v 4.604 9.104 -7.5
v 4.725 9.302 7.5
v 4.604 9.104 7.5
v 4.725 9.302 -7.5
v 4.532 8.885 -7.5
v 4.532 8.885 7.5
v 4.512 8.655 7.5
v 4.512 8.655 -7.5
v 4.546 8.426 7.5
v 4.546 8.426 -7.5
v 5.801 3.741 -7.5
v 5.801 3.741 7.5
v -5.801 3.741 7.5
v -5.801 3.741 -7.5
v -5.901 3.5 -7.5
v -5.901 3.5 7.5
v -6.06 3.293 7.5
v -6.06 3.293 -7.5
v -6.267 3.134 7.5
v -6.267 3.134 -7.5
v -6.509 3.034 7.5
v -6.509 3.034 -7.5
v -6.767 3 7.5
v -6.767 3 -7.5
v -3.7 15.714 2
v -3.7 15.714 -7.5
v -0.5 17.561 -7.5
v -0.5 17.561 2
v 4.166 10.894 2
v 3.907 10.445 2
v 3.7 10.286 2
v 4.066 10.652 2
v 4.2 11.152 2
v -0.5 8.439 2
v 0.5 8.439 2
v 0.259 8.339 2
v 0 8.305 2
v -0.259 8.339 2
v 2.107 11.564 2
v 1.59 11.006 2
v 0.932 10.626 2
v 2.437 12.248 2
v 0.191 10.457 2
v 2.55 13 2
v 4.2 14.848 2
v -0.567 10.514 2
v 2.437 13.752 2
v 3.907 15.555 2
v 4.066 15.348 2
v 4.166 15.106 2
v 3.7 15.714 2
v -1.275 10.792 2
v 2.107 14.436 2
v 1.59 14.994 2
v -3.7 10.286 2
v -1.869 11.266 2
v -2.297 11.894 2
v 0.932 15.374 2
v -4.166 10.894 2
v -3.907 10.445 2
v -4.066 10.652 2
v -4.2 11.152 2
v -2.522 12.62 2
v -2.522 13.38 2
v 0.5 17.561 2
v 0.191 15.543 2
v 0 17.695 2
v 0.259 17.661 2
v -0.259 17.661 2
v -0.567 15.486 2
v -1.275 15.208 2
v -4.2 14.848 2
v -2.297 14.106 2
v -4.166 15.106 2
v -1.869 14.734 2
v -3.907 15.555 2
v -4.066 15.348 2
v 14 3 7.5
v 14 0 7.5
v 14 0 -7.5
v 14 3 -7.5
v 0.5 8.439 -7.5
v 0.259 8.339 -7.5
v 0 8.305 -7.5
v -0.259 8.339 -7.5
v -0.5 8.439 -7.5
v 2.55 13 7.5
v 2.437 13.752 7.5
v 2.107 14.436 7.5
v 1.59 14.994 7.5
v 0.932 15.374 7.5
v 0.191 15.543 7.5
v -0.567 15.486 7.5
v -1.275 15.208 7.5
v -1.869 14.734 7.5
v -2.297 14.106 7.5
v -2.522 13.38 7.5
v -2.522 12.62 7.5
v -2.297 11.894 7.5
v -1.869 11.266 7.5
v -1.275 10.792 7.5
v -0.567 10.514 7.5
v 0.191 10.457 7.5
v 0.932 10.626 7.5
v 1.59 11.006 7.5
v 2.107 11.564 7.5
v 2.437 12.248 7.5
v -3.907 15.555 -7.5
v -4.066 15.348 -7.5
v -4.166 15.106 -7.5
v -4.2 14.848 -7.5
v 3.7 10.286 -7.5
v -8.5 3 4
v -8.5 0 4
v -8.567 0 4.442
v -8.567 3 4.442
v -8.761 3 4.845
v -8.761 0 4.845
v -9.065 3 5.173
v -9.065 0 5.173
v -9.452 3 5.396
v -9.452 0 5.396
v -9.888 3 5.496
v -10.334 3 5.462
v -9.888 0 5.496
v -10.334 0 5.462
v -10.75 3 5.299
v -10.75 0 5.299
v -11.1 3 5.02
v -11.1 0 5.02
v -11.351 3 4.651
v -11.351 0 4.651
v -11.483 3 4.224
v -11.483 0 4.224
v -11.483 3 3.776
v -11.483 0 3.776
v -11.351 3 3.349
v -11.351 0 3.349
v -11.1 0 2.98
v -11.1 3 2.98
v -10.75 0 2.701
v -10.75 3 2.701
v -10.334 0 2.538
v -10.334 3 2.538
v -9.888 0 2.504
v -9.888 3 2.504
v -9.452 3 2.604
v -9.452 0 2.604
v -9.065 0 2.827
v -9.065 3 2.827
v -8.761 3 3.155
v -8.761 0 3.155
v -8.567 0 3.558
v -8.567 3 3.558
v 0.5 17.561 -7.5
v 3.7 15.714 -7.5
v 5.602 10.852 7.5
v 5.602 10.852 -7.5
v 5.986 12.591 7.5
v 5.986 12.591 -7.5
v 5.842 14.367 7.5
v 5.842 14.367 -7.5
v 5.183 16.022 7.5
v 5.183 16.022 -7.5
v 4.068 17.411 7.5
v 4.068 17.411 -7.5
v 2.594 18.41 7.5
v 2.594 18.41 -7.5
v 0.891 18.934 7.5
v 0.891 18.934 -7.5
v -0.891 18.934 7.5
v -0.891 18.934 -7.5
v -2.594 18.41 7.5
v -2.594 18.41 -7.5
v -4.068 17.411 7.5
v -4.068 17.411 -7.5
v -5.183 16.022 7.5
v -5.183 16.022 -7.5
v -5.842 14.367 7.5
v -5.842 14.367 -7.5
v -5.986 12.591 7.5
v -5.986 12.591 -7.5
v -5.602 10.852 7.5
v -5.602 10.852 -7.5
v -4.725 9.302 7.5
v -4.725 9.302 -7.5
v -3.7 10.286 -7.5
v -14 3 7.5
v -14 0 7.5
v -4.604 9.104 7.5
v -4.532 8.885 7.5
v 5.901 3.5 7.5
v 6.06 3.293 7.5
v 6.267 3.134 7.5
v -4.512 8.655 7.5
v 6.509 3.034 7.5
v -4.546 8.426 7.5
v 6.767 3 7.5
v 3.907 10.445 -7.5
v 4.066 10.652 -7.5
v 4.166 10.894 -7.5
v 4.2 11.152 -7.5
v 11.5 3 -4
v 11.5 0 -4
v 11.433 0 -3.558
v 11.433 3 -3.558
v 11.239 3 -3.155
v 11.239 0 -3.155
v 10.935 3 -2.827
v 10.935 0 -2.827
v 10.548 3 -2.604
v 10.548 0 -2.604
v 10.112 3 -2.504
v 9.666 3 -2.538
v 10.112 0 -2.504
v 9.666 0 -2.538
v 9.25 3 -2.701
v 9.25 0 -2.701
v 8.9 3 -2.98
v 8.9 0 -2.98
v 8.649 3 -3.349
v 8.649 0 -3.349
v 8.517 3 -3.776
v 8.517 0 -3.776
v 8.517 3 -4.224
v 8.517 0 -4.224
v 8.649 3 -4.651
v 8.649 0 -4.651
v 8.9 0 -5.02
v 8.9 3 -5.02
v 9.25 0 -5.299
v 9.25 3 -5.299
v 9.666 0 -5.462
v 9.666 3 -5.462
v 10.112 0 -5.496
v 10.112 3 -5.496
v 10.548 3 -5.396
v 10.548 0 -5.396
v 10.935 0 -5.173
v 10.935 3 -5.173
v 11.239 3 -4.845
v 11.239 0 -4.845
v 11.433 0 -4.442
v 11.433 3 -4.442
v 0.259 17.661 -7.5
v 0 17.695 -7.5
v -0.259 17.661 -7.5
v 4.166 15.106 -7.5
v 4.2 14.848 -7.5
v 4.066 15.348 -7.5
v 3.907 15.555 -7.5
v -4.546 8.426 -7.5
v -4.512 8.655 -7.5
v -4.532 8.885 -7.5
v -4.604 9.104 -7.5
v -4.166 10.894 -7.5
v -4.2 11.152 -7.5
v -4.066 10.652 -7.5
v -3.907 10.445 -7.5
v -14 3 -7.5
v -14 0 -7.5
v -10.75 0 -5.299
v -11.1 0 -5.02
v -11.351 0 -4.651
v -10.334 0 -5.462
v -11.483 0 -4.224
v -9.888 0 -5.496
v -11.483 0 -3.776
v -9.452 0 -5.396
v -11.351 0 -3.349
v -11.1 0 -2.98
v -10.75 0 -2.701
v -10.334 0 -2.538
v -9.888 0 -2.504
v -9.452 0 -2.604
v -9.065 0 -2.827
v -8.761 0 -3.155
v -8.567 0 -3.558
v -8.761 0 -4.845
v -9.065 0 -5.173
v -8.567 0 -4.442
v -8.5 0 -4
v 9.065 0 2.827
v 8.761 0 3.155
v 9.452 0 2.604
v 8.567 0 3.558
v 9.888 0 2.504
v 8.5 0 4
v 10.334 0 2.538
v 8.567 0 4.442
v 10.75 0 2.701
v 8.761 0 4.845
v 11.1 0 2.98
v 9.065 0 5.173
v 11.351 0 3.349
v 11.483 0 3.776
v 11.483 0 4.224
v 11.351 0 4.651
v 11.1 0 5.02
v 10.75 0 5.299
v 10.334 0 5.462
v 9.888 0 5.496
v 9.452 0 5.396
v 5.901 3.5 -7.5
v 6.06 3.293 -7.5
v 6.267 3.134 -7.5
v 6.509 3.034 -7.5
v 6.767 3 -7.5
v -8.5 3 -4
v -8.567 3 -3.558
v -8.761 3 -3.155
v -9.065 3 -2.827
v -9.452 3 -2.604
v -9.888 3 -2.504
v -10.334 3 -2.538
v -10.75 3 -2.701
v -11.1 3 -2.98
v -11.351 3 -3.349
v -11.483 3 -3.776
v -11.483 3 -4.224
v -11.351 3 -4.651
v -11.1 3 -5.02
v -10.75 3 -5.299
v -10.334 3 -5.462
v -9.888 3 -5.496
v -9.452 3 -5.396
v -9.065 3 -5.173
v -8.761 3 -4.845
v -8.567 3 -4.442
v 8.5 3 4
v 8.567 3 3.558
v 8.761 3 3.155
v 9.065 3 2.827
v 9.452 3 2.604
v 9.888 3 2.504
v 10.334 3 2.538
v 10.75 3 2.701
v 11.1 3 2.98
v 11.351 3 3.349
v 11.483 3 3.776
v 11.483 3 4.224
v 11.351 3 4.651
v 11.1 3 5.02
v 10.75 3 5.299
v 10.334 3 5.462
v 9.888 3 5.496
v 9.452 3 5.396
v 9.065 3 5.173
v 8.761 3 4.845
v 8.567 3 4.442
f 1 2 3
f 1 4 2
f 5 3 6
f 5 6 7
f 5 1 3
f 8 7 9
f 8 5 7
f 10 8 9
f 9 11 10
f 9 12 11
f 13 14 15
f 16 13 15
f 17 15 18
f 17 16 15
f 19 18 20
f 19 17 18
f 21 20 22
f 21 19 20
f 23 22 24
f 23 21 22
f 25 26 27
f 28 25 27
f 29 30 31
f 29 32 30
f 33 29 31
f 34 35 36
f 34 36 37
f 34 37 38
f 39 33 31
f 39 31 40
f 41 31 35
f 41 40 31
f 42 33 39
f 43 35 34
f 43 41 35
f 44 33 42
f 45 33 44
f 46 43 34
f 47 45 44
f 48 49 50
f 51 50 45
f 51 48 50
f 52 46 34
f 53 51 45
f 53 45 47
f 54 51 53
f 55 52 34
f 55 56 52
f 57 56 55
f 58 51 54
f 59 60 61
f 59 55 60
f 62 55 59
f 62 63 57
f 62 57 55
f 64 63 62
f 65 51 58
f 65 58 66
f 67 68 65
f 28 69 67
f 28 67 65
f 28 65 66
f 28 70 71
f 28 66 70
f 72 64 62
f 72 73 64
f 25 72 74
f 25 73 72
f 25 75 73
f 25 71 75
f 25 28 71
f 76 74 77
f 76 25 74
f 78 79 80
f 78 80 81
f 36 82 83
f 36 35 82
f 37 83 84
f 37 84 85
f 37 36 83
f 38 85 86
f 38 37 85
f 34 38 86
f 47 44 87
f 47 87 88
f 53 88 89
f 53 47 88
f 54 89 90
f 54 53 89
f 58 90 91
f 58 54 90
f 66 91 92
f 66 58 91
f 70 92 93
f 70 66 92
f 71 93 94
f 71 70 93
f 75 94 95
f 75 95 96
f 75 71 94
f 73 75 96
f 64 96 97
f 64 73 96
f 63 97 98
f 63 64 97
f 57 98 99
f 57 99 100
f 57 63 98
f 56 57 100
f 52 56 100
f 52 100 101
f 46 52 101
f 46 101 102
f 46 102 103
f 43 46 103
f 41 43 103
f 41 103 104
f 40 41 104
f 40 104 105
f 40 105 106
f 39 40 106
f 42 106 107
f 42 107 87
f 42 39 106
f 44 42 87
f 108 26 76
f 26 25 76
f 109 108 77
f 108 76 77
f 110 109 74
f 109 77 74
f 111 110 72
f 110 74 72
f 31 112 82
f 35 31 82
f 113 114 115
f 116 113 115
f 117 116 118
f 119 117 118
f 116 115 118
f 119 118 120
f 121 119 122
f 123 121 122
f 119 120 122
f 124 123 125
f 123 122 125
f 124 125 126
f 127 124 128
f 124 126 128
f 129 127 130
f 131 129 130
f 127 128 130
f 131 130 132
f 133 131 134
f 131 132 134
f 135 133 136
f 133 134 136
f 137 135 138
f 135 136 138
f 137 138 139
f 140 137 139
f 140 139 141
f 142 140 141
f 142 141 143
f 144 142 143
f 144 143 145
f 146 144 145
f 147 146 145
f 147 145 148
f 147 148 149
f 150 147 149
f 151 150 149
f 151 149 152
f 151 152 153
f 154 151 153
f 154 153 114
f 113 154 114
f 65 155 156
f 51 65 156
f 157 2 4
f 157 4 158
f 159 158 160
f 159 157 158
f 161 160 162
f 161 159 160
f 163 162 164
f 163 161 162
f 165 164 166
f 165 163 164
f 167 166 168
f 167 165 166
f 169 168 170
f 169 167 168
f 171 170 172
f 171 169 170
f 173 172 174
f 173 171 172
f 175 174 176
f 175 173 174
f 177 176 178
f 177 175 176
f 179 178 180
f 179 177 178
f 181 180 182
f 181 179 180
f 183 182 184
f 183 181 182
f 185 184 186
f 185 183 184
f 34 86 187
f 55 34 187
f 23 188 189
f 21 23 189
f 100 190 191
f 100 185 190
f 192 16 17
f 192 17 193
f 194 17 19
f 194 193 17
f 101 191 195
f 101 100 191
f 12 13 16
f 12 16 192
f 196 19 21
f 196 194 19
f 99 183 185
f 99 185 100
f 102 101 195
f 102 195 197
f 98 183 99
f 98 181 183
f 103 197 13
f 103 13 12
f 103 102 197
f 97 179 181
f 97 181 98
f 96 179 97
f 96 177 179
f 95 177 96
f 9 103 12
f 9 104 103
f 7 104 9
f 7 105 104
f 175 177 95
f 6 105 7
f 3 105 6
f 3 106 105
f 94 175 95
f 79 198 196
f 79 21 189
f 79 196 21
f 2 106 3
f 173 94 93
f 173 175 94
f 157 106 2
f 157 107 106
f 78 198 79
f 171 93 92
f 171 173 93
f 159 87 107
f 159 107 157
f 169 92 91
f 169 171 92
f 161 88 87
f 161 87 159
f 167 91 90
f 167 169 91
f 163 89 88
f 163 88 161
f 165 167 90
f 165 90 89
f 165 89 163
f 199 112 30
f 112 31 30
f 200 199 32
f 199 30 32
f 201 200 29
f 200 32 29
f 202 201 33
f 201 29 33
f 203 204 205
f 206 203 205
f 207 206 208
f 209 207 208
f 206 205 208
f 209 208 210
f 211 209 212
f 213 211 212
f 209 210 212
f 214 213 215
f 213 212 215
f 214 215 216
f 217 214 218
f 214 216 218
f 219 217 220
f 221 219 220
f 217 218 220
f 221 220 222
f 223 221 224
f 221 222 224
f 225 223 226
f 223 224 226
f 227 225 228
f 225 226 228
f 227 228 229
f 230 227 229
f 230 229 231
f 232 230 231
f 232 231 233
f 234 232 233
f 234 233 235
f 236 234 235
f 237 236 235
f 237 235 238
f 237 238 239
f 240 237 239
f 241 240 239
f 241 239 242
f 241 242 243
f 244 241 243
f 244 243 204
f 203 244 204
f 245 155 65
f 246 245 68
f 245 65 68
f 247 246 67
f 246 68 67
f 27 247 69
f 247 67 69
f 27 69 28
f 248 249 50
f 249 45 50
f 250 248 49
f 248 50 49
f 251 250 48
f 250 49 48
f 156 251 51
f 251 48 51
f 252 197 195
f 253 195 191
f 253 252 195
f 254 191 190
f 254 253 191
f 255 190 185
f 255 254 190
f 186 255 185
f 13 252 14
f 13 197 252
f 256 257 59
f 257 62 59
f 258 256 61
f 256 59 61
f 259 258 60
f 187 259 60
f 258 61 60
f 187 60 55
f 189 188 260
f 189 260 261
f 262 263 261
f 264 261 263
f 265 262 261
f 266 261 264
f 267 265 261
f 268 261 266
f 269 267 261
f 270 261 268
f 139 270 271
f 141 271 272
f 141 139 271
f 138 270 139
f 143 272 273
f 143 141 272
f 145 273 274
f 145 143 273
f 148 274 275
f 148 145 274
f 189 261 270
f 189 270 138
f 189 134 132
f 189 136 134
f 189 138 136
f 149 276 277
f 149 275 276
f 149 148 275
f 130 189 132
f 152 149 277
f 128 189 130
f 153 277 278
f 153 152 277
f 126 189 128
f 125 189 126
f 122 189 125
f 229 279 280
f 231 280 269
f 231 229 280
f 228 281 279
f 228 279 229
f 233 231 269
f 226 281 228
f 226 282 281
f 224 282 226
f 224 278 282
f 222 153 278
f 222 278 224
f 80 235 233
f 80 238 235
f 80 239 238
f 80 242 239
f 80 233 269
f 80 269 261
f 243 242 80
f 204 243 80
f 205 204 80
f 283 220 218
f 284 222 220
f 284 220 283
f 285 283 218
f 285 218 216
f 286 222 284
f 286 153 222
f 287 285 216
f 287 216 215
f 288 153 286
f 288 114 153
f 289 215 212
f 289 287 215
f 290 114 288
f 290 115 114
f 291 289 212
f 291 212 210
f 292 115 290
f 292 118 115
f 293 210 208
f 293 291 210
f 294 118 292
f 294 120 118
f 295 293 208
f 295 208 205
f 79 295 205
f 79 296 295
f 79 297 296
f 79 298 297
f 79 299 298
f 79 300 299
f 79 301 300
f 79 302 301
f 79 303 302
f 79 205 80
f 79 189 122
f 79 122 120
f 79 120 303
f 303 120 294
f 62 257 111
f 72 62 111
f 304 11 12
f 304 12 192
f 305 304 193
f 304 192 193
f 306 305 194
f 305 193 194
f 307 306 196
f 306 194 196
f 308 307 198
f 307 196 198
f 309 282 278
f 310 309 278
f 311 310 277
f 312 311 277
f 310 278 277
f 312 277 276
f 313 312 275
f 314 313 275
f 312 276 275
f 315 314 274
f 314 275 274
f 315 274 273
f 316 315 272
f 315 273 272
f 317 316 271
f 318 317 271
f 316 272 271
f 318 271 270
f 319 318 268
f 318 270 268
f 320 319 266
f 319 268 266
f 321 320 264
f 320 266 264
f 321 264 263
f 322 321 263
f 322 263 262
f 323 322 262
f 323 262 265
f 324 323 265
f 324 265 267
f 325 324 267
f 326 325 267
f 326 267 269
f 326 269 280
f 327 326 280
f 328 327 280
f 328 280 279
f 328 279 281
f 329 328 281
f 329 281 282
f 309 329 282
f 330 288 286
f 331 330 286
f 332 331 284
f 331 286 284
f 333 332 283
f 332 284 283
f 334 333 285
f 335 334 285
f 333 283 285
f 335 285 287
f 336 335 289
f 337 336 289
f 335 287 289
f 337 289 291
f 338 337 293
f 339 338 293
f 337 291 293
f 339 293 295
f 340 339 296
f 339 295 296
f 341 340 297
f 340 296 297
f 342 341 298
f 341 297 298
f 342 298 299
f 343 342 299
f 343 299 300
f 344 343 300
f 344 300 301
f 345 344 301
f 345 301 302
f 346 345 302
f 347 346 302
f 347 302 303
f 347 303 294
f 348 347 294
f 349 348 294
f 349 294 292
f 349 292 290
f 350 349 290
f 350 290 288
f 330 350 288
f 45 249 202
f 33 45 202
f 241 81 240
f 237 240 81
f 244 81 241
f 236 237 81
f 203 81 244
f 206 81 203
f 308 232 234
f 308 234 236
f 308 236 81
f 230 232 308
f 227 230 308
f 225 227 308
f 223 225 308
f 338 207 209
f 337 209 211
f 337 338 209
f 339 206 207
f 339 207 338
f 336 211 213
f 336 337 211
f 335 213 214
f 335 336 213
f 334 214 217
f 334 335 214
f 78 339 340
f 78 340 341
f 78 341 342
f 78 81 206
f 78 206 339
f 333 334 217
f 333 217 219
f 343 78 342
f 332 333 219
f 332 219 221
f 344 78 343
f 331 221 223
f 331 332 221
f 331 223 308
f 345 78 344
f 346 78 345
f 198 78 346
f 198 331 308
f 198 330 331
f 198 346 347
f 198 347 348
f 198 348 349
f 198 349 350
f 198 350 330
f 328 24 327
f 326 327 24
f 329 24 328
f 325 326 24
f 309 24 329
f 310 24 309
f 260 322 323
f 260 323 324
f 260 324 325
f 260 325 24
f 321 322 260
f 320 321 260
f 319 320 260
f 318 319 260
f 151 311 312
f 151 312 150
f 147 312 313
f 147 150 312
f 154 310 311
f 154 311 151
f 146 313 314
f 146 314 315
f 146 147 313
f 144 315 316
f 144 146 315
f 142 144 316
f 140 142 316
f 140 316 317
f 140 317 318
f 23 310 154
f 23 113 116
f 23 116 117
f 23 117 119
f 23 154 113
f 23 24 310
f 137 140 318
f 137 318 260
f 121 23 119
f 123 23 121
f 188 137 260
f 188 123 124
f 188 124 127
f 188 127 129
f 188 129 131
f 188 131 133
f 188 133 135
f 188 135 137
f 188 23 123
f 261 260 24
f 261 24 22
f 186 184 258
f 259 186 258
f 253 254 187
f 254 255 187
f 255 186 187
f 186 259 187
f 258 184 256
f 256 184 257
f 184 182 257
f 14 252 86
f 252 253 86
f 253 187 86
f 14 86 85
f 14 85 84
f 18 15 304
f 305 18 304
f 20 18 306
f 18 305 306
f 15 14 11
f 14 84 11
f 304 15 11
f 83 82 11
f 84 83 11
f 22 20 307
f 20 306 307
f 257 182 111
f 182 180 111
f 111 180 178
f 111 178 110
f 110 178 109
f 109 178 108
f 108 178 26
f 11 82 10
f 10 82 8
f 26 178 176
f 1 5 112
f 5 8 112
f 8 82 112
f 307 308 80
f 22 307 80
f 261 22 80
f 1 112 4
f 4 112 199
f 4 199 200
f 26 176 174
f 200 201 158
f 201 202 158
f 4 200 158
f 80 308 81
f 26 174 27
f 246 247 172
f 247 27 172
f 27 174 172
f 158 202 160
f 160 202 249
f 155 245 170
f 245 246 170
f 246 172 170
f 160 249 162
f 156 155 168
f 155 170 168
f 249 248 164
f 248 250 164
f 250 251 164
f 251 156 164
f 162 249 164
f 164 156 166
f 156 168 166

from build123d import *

# Parameters (mm, degrees)
SKETCH_1_R          = 6
SKETCH_1_R_2        = 2.55
EXTRUDE_1_DEPTH     = 7.5
SKETCH_2_R          = 1.5
CUT_EXTRUDE_1_DEPTH = 25.763884994
CUT_EXTRUDE_2_DEPTH = 9.5
FILLET_1_R          = 1


with BuildPart() as part:
    # 草图1 → 凸台-拉伸1 (new, symmetric)
    # profile 1 of 2: a face of its own
    with BuildSketch(Plane.XY):
        with Locations((0, 13)):
            Circle(SKETCH_1_R)
        with Locations((0, 13)):
            Circle(SKETCH_1_R_2, mode=Mode.SUBTRACT)
    # profile 2 of 2: a face of its own
    with BuildSketch(Plane.XY):
        with BuildLine():
            ThreePointArc((4.410490728, 8.932129361), (0, 7), (-4.410490728, 8.932129361))
            Line((-4.410490728, 8.932129361), (-6, 3))
            Line((-6, 3), (-14, 3))
            Line((-14, 3), (-14, 0))
            Line((-14, 0), (14, 0))
            Line((14, 0), (14, 3))
            Line((14, 3), (6, 3))
            Line((6, 3), (4.410490728, 8.932129361))
        make_face()
    extrude(amount=EXTRUDE_1_DEPTH, both=True)

    # 草图2 → 切除-拉伸1 (cut, through all)
    with BuildSketch(Plane.XZ):
        with Locations((-10, 4)):
            Circle(SKETCH_2_R)
        with Locations((-10, -4)):
            Circle(SKETCH_2_R)
        with Locations((10, -4)):
            Circle(SKETCH_2_R)
        with Locations(Location((10, 4, 0), (0, 0, 180))):
            Circle(SKETCH_2_R)
    extrude(amount=-CUT_EXTRUDE_1_DEPTH, mode=Mode.SUBTRACT)

    # 草图3 → 切除-拉伸2 (cut)
    with BuildSketch(Plane(origin=(0, 0, -7.5), x_dir=(-1, 0, 0), z_dir=(0, 0, -1))):
        Polygon((0, 8.150257739), (4.2, 10.575128869), (4.2, 15.424871131), (0, 17.849742261), (-4.2, 15.424871131), (-4.2, 10.575128869), align=None)
    extrude(amount=-CUT_EXTRUDE_2_DEPTH, mode=Mode.SUBTRACT)

    # 圆角1
    fillet_1_edges = [part.edges().sort_by_distance(p)[0] for p in [
        (4.410490728, 8.932129361, 0),
        (6, 3, 0),
        (-6, 3, 0),
        (-4.410490728, 8.932129361, 0),
        (0, 8.150257739, -2.75),
        (4.2, 10.575128869, -2.75),
        (4.2, 15.424871131, -2.75),
        (0, 17.849742261, -2.75),
        (-4.2, 15.424871131, -2.75),
        (-4.2, 10.575128869, -2.75),
    ]]
    fillet(fillet_1_edges, radius=FILLET_1_R)


solid = part.part
